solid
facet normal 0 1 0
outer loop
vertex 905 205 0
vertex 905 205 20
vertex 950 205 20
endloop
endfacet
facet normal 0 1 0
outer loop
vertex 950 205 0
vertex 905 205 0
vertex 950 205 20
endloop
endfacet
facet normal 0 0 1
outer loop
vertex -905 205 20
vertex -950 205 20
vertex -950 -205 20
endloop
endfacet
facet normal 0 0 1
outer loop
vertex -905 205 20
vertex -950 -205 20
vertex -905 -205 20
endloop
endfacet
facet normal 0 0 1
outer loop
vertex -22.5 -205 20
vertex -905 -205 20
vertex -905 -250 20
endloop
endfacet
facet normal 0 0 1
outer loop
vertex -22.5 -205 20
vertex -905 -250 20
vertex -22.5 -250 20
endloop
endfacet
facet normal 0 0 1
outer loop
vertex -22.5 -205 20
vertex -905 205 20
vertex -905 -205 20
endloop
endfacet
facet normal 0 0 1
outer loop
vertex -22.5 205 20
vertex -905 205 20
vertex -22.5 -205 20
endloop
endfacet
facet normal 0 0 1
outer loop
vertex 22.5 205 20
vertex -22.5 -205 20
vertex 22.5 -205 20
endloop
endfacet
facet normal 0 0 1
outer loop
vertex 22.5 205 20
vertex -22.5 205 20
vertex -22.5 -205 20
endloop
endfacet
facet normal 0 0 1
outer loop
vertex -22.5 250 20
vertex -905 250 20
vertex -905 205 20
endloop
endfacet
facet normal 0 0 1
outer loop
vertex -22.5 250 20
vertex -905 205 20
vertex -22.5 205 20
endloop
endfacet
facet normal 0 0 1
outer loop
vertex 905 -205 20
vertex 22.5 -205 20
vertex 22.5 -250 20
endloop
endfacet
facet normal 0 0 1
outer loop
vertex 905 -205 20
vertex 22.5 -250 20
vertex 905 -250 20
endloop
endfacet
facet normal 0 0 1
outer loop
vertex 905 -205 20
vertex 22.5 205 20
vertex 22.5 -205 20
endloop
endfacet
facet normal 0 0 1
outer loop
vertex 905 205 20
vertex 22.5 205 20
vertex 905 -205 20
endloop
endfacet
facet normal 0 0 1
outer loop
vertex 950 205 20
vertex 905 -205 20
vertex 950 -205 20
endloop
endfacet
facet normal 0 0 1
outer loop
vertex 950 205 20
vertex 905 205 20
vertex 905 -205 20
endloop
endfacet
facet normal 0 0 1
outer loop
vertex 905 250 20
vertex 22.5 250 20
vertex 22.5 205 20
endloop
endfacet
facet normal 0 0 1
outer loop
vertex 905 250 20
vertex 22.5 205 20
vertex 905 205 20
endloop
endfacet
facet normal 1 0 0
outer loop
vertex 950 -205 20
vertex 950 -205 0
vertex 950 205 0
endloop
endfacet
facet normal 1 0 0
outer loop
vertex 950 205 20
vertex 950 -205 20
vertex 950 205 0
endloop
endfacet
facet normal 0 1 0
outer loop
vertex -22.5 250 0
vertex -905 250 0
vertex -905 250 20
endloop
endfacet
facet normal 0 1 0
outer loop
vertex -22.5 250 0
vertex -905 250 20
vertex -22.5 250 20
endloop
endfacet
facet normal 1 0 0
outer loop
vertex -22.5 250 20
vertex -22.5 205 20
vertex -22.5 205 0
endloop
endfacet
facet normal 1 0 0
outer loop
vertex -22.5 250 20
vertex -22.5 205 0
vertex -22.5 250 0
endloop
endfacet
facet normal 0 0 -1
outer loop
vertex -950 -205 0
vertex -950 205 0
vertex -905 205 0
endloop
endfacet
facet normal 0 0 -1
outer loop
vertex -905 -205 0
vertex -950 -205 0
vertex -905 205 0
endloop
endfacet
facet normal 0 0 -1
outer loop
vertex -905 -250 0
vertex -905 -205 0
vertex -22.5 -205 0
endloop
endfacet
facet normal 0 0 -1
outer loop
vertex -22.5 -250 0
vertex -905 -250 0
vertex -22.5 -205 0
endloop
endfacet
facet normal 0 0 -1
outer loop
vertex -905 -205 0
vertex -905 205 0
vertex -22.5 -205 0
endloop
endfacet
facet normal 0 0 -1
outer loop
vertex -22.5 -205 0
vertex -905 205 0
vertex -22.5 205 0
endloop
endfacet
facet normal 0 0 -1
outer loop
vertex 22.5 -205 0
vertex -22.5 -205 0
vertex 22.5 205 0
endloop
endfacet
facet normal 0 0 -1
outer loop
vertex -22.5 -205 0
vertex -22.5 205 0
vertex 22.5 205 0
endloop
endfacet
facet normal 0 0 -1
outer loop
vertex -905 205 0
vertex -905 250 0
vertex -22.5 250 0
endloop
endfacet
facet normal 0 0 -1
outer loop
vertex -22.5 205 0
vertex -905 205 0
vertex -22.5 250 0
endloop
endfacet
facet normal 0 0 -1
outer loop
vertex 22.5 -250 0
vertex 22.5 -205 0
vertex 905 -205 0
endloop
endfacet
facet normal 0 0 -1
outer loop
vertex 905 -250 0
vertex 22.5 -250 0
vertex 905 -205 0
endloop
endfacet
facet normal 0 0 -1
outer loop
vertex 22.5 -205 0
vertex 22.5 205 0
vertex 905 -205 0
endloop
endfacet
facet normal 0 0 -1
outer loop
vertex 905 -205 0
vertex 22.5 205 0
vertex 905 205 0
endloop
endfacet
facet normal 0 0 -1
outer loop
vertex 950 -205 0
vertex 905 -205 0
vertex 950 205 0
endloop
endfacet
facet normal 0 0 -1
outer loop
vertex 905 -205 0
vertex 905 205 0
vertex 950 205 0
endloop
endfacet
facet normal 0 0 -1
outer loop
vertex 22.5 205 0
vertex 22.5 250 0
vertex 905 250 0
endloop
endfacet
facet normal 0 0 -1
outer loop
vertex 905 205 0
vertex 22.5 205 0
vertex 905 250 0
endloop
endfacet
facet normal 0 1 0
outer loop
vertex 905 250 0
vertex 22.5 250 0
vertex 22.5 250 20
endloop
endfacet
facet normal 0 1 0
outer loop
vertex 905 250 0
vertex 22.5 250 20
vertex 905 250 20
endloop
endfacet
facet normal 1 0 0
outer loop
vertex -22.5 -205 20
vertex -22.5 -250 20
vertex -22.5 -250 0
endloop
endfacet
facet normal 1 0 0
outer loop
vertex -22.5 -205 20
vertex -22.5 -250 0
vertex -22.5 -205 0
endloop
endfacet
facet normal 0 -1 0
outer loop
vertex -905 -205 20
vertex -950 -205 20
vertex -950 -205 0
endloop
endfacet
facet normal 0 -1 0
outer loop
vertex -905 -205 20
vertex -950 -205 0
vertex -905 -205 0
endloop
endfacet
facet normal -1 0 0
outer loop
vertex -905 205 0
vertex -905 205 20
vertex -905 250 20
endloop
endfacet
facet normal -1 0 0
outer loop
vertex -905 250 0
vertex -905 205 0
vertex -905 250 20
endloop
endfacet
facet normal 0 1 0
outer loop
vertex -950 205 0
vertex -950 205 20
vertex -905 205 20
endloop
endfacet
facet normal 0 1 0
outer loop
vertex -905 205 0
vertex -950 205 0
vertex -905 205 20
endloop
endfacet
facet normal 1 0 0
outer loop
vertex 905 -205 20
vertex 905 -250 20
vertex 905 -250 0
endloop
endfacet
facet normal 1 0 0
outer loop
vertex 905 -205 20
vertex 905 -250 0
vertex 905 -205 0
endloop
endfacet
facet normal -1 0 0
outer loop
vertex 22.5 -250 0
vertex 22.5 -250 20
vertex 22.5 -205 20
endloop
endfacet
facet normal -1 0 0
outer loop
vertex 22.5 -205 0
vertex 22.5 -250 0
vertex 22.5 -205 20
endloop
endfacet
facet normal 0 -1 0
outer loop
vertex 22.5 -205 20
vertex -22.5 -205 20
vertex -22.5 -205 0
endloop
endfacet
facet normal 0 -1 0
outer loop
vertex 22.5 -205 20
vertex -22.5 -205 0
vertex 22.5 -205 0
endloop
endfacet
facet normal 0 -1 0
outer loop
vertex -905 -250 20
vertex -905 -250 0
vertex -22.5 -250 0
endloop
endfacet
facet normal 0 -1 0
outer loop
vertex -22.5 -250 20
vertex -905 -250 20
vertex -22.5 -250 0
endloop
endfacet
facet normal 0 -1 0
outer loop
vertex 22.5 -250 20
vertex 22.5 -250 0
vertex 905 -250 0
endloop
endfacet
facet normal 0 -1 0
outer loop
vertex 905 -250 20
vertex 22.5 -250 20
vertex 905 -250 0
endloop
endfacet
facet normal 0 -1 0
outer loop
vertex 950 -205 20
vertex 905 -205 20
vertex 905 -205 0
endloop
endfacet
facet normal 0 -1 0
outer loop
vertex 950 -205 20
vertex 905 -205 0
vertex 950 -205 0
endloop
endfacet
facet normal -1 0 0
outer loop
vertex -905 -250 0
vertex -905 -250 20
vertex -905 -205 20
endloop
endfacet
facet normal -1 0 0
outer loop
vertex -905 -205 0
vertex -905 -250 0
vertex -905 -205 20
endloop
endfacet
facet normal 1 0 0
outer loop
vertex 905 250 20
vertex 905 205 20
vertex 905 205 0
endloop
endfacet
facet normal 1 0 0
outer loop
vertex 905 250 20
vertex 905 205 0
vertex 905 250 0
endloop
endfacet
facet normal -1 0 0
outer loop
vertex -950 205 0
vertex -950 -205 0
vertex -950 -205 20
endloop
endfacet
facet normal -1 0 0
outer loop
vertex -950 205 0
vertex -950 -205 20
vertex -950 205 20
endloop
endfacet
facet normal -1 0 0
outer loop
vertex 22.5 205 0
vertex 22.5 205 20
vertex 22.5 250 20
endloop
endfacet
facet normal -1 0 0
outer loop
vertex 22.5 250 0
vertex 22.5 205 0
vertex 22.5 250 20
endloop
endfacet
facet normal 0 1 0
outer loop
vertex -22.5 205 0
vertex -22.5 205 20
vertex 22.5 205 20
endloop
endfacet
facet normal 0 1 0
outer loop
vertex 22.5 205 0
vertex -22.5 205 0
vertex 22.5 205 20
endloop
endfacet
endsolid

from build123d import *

# Parameters (mm, degrees)
F0_W     = 1900
F0_H     = 500
F1_DEPTH = 20
F2_W     = 45
F2_H     = 45
F3_DEPTH = 20.001


with BuildPart() as f1:
    # F0 (on Top) → F1 (new body)
    with BuildSketch(Plane.XY):
        Rectangle(F0_W, F0_H)
    extrude(amount=F1_DEPTH)

    # F2 (on face) → F3 (cut, through all)
    with BuildSketch(Plane.XY.offset(20)):
        with Locations((-927.5, 227.5)):
            Rectangle(F2_W, F2_H)
        with Locations((-927.5, -227.5)):
            Rectangle(F2_W, F2_H)
        with Locations((927.5, 227.5)):
            Rectangle(F2_W, F2_H)
        with Locations((927.5, -227.5)):
            Rectangle(F2_W, F2_H)
        with Locations((0, 227.5)):
            Rectangle(F2_W, F2_H)
        with Locations((0, -227.5)):
            Rectangle(F2_W, F2_H)
    extrude(amount=-F3_DEPTH, mode=Mode.SUBTRACT)


solid = f1.part
